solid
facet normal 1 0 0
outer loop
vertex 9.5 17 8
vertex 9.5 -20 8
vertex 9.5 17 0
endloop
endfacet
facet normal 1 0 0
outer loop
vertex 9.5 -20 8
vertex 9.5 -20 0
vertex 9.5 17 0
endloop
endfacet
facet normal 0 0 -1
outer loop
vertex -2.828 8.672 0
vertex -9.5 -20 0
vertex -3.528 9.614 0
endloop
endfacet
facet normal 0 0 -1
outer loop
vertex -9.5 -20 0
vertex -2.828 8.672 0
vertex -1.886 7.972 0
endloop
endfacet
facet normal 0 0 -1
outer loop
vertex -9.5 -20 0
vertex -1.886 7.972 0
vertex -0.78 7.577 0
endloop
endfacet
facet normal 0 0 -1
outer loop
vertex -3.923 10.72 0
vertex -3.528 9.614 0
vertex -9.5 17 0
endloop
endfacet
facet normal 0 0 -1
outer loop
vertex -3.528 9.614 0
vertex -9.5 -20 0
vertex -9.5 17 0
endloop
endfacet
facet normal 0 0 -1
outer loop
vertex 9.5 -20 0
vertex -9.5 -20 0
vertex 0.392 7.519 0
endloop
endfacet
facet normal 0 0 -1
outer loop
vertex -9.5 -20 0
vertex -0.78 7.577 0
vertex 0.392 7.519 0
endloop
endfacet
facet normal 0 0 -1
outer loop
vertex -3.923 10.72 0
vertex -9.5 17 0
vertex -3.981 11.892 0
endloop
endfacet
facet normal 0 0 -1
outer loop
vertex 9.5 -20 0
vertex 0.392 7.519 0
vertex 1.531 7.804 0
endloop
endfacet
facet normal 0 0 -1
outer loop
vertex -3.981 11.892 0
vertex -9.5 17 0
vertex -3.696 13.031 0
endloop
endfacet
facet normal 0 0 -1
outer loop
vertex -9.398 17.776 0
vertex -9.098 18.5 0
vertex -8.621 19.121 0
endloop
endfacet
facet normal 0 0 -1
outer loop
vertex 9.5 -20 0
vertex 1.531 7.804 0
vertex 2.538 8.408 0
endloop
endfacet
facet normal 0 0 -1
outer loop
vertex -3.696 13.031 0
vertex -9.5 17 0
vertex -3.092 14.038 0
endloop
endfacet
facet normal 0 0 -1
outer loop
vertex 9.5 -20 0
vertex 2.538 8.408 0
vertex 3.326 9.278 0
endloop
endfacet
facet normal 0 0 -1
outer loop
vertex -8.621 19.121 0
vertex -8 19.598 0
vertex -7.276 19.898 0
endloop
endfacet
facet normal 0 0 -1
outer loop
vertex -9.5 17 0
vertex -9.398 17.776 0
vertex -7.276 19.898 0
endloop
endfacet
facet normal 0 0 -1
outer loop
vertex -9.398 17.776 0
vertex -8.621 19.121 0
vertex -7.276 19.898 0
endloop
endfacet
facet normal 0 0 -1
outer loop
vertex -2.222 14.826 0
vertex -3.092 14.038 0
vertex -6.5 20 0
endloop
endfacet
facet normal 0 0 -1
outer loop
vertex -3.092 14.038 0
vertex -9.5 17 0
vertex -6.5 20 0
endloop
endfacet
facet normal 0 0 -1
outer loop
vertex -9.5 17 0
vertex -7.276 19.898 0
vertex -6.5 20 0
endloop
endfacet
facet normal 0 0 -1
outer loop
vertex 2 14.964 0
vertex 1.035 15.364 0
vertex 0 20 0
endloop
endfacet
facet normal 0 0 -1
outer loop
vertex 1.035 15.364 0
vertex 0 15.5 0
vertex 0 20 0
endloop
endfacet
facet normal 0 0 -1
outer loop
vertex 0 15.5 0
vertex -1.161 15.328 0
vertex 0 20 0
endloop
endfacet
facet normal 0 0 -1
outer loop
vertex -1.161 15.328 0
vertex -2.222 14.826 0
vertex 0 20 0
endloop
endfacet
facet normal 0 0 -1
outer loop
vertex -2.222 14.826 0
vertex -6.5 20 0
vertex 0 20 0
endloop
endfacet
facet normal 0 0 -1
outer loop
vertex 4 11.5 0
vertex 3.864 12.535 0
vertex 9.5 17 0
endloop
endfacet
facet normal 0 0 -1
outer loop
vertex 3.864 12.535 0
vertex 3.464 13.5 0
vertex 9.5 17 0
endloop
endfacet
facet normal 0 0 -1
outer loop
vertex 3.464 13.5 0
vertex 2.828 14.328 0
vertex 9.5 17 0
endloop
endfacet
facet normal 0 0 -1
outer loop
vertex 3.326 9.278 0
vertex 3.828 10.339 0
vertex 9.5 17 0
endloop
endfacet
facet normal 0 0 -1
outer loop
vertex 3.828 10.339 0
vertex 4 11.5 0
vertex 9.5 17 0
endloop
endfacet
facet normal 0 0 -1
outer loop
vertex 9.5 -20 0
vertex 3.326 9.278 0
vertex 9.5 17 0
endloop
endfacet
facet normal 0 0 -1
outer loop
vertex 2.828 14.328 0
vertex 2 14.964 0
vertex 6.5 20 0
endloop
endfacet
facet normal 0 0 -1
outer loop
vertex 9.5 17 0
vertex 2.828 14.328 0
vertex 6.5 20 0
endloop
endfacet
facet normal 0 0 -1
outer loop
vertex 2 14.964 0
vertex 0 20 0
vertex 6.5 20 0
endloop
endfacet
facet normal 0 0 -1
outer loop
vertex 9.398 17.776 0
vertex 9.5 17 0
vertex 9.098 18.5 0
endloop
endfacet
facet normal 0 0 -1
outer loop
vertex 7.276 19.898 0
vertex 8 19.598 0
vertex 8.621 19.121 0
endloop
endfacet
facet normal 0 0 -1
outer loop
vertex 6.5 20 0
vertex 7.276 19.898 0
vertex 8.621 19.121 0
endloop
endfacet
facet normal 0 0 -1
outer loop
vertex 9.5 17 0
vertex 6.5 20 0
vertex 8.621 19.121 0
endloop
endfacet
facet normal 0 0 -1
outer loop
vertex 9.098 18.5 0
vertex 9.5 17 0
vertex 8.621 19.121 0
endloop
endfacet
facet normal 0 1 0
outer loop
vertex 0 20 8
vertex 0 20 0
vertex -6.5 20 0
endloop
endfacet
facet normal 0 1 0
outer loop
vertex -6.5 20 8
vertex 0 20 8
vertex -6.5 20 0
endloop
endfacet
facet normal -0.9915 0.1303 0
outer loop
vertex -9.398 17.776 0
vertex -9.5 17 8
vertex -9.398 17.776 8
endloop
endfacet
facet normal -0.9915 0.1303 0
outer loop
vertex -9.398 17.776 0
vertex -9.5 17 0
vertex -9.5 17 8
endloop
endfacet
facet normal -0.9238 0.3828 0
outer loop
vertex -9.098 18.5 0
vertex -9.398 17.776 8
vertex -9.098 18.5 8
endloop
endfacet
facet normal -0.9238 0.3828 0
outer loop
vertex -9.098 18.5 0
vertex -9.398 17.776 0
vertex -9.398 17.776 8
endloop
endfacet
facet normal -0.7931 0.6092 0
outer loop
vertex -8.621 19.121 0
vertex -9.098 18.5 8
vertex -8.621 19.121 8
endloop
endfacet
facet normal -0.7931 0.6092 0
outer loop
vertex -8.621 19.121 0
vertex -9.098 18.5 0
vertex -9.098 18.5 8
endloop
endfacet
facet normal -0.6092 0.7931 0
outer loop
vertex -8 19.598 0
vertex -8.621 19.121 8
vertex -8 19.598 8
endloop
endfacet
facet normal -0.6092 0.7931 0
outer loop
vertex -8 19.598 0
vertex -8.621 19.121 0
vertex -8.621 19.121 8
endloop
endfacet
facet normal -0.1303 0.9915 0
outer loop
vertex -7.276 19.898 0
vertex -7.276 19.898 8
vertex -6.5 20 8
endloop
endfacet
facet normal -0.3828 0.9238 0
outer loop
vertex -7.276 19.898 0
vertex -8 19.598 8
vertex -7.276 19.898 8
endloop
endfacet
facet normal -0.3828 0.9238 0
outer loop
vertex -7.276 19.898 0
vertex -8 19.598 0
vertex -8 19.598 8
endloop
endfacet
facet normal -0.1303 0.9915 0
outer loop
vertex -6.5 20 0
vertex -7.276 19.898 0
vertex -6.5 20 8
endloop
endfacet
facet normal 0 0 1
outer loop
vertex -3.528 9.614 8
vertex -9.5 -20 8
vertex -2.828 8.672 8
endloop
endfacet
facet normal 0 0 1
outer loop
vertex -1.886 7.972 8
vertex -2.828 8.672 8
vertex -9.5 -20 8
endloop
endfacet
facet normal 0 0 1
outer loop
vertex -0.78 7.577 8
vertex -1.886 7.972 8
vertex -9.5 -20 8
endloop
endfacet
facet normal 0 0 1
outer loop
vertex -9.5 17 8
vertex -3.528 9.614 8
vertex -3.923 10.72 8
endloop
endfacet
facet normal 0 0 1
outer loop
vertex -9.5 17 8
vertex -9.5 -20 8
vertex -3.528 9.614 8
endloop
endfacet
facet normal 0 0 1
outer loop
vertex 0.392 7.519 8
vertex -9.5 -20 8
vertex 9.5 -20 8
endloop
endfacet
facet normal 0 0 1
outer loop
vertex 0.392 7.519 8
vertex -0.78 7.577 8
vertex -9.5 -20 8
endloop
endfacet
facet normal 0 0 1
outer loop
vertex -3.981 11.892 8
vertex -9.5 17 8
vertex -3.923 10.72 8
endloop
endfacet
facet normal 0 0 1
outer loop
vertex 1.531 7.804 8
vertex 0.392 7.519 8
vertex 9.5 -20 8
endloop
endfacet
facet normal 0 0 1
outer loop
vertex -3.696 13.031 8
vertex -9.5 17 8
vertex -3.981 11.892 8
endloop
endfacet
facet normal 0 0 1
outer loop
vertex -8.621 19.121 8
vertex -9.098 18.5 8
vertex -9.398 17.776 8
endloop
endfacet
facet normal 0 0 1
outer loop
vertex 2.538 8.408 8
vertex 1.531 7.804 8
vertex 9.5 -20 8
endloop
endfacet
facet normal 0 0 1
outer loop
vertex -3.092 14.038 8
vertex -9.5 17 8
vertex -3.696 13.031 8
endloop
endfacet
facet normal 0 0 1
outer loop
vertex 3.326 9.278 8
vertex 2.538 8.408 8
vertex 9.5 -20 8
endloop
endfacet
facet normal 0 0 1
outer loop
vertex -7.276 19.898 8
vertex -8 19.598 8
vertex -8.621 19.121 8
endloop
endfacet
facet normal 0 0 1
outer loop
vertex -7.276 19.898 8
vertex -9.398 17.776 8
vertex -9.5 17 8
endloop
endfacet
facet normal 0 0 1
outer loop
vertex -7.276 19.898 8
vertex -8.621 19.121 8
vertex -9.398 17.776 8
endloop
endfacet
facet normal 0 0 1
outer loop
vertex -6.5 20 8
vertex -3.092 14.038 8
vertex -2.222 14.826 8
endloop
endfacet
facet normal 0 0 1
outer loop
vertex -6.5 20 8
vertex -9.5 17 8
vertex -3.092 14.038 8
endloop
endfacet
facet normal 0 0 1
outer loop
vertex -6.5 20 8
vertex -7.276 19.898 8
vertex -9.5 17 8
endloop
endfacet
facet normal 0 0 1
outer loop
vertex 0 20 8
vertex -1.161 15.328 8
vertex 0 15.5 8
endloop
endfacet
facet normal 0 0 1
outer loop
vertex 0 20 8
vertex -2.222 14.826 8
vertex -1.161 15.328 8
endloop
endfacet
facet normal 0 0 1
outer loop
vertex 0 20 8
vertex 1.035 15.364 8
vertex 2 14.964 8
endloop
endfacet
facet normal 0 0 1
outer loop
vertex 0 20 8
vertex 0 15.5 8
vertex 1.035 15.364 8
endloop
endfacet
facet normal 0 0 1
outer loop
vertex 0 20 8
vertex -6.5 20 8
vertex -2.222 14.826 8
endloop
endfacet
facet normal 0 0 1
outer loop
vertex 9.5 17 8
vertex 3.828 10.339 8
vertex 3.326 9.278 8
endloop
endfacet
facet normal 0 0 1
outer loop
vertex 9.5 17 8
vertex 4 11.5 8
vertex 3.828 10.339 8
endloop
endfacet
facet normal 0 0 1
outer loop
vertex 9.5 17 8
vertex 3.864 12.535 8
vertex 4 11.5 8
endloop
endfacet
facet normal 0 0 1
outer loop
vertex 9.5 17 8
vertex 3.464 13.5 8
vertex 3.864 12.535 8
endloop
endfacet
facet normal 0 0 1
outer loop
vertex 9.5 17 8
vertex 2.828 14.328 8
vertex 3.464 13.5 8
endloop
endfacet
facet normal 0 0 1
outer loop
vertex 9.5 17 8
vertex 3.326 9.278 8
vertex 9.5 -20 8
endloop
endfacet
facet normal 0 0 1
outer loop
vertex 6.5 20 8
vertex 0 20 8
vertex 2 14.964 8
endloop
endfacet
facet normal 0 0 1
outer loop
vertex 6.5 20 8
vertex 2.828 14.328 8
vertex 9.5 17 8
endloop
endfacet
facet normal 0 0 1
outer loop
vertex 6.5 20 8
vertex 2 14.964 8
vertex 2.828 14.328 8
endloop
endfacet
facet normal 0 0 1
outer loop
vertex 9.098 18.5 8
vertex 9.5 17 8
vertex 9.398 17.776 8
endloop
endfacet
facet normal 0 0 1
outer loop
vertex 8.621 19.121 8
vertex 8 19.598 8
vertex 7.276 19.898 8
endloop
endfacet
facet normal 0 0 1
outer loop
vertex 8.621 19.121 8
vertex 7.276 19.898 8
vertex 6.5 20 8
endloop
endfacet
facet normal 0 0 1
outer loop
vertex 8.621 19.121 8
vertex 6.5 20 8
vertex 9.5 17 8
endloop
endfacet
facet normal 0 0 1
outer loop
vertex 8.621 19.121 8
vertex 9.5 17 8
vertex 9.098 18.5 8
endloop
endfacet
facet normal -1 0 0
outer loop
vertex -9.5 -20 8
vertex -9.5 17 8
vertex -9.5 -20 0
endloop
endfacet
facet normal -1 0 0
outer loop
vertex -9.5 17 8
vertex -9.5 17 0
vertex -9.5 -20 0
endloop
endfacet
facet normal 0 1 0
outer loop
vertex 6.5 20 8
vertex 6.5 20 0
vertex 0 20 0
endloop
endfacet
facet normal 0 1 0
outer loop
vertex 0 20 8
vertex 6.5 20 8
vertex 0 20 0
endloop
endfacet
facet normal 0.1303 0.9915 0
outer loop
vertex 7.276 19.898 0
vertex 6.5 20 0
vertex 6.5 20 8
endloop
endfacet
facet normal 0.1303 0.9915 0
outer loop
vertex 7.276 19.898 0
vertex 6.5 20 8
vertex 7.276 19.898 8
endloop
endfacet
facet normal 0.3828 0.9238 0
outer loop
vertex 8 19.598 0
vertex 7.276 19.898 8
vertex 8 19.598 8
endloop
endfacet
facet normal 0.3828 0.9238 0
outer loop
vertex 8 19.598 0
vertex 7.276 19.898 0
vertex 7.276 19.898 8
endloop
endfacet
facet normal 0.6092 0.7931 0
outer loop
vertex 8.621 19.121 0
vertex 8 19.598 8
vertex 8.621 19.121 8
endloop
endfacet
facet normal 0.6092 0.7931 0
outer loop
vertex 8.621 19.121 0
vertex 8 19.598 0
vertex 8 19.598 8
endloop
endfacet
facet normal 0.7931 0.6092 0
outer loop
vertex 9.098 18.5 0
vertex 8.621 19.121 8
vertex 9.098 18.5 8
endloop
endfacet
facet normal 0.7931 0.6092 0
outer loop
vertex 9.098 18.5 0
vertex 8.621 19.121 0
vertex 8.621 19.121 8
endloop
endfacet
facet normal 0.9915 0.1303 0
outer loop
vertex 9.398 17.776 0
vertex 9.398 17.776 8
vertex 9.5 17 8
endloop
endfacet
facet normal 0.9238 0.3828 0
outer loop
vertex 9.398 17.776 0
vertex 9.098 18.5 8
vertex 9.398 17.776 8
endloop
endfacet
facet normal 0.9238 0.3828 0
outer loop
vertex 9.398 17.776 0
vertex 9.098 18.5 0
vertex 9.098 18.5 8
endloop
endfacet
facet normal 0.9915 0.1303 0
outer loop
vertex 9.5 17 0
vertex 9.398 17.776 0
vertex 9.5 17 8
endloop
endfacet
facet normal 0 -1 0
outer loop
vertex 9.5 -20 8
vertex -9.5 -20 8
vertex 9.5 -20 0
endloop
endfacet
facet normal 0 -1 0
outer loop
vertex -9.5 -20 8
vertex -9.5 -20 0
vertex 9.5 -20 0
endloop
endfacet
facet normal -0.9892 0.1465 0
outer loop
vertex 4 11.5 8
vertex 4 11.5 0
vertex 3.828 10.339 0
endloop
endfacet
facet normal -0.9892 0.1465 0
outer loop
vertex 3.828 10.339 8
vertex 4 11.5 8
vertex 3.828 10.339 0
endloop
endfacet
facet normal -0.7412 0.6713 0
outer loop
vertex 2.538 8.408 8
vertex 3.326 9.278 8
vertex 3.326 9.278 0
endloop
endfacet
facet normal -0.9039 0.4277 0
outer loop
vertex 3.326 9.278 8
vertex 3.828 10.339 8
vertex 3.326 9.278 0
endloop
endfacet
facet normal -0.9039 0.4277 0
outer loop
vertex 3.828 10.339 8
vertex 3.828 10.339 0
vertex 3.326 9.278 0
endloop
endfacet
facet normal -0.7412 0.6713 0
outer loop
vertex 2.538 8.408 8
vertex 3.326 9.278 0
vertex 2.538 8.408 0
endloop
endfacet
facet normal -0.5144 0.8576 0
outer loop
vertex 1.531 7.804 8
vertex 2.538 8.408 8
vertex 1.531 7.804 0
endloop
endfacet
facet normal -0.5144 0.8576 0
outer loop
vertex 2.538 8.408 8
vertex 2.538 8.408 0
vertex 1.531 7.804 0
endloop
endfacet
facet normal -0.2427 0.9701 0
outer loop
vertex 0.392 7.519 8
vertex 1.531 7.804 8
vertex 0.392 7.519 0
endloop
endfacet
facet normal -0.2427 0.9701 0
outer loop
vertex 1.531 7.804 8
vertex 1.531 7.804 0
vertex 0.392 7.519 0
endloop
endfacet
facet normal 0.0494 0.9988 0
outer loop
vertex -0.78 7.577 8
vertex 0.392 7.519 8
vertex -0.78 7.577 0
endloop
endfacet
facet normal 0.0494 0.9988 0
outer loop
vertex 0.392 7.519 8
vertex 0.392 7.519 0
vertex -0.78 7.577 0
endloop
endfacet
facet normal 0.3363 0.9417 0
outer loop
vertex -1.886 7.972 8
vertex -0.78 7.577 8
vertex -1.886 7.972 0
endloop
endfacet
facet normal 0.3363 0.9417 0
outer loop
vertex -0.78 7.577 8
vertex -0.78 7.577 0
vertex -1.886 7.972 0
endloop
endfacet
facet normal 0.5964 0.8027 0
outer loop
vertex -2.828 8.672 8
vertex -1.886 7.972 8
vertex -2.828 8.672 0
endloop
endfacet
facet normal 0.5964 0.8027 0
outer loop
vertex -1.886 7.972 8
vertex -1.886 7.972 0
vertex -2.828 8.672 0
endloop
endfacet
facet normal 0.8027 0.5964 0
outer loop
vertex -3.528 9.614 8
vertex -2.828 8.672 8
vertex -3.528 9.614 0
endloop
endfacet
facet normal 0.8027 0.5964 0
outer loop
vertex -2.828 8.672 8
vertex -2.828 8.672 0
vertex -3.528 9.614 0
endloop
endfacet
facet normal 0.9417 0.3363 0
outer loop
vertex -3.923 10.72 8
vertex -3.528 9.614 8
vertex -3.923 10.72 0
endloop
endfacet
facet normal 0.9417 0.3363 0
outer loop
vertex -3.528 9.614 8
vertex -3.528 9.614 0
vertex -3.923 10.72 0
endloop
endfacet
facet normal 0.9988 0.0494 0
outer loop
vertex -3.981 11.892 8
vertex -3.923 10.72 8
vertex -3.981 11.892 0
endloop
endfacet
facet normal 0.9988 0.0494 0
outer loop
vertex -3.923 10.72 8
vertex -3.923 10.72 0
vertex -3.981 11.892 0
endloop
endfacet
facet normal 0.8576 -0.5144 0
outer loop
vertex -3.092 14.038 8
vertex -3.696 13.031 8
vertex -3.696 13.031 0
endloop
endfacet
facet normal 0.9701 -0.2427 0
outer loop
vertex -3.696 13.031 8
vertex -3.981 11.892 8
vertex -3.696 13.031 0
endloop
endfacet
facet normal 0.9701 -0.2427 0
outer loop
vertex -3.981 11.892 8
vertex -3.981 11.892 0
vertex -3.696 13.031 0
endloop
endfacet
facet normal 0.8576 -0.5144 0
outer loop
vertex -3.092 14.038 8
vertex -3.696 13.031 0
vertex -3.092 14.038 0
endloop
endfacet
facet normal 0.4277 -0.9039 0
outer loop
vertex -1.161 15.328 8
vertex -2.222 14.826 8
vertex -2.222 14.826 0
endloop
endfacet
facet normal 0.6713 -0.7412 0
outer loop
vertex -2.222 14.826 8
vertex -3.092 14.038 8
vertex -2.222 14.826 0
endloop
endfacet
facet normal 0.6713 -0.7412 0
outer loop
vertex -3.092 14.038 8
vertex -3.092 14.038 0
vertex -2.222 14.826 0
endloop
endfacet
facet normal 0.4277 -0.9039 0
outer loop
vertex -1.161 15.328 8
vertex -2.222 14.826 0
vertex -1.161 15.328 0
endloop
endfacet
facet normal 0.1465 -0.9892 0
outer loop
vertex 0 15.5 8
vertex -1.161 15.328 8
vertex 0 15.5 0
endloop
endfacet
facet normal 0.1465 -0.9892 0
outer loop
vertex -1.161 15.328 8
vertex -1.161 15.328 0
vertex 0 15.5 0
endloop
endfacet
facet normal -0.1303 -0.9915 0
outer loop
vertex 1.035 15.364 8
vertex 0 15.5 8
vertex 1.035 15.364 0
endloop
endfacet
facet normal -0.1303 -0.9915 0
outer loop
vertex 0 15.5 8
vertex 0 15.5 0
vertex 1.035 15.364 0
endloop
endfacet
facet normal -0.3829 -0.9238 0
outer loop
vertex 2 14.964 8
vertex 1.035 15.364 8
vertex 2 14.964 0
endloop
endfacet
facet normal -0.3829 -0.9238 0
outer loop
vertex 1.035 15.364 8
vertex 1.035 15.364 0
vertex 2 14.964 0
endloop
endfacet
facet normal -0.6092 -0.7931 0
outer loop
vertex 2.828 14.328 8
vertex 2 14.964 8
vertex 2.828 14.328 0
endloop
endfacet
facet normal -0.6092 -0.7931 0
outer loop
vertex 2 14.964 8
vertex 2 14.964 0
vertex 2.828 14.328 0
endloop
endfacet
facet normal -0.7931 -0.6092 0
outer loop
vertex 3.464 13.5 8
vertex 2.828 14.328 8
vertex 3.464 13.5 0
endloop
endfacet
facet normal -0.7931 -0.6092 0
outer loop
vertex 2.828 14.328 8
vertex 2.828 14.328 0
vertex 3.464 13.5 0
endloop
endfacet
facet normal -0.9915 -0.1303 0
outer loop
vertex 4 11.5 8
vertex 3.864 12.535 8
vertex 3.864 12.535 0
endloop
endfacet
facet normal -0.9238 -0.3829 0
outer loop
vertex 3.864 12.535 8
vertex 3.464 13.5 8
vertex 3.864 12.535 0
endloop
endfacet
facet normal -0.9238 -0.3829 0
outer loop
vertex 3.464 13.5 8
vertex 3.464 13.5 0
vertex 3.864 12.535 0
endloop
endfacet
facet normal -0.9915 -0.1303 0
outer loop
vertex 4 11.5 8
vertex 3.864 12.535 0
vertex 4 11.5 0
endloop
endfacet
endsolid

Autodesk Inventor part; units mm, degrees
ref_plane "YZ Plane" through (0, 0, 0) normal (1, 0, 0) x (0, 1, 0)
ref_plane "XZ Plane" through (0, 0, 0) normal (0, 1, 0) x (-1, 0, 0)
ref_plane "XY Plane" through (0, 0, 0) normal (0, 0, 1) x (1, 0, 0)
sketch "Sketch2" plane through (0, 0, 0) normal (0, 0, 1) x (1, 0, 0)
  line L0 (-9.5, -20) -> (9.5, -20)
  line L1 (9.5, -20) -> (9.5, 17)
  line L2 (6.5, 20) -> (-6.5, 20)
  line L3 (-9.5, 17) -> (-9.5, -20)
  line L4 (-9.5, -20) -> (9.5, 20) construction
  line L5 (9.5, -20) -> (-9.5, 20) construction
  arc A0 (-6.5, 20) -> (-9.5, 17) centre (-6.5, 17) ccw
  arc A1 (9.5, 17) -> (6.5, 20) centre (6.5, 17) ccw
  line L6 (0, 20) -> (0, 11.5)
  circle A2 centre (0, 11.5) radius 4
  point P0 (0, 0)
  dimension "d7" = 19
  dimension "d8" = 40
  dimension "d9" = 3
  dimension "d10" = 8.5
  dimension "d11" = 8
extrude "Extrusion2" add sketch "Sketch2" along normal blind 8
thread "Thread1" size "M8x1.25" class "6H" standard "ANSI Metric M Profile" full length
properties part number "Kengyel2"
